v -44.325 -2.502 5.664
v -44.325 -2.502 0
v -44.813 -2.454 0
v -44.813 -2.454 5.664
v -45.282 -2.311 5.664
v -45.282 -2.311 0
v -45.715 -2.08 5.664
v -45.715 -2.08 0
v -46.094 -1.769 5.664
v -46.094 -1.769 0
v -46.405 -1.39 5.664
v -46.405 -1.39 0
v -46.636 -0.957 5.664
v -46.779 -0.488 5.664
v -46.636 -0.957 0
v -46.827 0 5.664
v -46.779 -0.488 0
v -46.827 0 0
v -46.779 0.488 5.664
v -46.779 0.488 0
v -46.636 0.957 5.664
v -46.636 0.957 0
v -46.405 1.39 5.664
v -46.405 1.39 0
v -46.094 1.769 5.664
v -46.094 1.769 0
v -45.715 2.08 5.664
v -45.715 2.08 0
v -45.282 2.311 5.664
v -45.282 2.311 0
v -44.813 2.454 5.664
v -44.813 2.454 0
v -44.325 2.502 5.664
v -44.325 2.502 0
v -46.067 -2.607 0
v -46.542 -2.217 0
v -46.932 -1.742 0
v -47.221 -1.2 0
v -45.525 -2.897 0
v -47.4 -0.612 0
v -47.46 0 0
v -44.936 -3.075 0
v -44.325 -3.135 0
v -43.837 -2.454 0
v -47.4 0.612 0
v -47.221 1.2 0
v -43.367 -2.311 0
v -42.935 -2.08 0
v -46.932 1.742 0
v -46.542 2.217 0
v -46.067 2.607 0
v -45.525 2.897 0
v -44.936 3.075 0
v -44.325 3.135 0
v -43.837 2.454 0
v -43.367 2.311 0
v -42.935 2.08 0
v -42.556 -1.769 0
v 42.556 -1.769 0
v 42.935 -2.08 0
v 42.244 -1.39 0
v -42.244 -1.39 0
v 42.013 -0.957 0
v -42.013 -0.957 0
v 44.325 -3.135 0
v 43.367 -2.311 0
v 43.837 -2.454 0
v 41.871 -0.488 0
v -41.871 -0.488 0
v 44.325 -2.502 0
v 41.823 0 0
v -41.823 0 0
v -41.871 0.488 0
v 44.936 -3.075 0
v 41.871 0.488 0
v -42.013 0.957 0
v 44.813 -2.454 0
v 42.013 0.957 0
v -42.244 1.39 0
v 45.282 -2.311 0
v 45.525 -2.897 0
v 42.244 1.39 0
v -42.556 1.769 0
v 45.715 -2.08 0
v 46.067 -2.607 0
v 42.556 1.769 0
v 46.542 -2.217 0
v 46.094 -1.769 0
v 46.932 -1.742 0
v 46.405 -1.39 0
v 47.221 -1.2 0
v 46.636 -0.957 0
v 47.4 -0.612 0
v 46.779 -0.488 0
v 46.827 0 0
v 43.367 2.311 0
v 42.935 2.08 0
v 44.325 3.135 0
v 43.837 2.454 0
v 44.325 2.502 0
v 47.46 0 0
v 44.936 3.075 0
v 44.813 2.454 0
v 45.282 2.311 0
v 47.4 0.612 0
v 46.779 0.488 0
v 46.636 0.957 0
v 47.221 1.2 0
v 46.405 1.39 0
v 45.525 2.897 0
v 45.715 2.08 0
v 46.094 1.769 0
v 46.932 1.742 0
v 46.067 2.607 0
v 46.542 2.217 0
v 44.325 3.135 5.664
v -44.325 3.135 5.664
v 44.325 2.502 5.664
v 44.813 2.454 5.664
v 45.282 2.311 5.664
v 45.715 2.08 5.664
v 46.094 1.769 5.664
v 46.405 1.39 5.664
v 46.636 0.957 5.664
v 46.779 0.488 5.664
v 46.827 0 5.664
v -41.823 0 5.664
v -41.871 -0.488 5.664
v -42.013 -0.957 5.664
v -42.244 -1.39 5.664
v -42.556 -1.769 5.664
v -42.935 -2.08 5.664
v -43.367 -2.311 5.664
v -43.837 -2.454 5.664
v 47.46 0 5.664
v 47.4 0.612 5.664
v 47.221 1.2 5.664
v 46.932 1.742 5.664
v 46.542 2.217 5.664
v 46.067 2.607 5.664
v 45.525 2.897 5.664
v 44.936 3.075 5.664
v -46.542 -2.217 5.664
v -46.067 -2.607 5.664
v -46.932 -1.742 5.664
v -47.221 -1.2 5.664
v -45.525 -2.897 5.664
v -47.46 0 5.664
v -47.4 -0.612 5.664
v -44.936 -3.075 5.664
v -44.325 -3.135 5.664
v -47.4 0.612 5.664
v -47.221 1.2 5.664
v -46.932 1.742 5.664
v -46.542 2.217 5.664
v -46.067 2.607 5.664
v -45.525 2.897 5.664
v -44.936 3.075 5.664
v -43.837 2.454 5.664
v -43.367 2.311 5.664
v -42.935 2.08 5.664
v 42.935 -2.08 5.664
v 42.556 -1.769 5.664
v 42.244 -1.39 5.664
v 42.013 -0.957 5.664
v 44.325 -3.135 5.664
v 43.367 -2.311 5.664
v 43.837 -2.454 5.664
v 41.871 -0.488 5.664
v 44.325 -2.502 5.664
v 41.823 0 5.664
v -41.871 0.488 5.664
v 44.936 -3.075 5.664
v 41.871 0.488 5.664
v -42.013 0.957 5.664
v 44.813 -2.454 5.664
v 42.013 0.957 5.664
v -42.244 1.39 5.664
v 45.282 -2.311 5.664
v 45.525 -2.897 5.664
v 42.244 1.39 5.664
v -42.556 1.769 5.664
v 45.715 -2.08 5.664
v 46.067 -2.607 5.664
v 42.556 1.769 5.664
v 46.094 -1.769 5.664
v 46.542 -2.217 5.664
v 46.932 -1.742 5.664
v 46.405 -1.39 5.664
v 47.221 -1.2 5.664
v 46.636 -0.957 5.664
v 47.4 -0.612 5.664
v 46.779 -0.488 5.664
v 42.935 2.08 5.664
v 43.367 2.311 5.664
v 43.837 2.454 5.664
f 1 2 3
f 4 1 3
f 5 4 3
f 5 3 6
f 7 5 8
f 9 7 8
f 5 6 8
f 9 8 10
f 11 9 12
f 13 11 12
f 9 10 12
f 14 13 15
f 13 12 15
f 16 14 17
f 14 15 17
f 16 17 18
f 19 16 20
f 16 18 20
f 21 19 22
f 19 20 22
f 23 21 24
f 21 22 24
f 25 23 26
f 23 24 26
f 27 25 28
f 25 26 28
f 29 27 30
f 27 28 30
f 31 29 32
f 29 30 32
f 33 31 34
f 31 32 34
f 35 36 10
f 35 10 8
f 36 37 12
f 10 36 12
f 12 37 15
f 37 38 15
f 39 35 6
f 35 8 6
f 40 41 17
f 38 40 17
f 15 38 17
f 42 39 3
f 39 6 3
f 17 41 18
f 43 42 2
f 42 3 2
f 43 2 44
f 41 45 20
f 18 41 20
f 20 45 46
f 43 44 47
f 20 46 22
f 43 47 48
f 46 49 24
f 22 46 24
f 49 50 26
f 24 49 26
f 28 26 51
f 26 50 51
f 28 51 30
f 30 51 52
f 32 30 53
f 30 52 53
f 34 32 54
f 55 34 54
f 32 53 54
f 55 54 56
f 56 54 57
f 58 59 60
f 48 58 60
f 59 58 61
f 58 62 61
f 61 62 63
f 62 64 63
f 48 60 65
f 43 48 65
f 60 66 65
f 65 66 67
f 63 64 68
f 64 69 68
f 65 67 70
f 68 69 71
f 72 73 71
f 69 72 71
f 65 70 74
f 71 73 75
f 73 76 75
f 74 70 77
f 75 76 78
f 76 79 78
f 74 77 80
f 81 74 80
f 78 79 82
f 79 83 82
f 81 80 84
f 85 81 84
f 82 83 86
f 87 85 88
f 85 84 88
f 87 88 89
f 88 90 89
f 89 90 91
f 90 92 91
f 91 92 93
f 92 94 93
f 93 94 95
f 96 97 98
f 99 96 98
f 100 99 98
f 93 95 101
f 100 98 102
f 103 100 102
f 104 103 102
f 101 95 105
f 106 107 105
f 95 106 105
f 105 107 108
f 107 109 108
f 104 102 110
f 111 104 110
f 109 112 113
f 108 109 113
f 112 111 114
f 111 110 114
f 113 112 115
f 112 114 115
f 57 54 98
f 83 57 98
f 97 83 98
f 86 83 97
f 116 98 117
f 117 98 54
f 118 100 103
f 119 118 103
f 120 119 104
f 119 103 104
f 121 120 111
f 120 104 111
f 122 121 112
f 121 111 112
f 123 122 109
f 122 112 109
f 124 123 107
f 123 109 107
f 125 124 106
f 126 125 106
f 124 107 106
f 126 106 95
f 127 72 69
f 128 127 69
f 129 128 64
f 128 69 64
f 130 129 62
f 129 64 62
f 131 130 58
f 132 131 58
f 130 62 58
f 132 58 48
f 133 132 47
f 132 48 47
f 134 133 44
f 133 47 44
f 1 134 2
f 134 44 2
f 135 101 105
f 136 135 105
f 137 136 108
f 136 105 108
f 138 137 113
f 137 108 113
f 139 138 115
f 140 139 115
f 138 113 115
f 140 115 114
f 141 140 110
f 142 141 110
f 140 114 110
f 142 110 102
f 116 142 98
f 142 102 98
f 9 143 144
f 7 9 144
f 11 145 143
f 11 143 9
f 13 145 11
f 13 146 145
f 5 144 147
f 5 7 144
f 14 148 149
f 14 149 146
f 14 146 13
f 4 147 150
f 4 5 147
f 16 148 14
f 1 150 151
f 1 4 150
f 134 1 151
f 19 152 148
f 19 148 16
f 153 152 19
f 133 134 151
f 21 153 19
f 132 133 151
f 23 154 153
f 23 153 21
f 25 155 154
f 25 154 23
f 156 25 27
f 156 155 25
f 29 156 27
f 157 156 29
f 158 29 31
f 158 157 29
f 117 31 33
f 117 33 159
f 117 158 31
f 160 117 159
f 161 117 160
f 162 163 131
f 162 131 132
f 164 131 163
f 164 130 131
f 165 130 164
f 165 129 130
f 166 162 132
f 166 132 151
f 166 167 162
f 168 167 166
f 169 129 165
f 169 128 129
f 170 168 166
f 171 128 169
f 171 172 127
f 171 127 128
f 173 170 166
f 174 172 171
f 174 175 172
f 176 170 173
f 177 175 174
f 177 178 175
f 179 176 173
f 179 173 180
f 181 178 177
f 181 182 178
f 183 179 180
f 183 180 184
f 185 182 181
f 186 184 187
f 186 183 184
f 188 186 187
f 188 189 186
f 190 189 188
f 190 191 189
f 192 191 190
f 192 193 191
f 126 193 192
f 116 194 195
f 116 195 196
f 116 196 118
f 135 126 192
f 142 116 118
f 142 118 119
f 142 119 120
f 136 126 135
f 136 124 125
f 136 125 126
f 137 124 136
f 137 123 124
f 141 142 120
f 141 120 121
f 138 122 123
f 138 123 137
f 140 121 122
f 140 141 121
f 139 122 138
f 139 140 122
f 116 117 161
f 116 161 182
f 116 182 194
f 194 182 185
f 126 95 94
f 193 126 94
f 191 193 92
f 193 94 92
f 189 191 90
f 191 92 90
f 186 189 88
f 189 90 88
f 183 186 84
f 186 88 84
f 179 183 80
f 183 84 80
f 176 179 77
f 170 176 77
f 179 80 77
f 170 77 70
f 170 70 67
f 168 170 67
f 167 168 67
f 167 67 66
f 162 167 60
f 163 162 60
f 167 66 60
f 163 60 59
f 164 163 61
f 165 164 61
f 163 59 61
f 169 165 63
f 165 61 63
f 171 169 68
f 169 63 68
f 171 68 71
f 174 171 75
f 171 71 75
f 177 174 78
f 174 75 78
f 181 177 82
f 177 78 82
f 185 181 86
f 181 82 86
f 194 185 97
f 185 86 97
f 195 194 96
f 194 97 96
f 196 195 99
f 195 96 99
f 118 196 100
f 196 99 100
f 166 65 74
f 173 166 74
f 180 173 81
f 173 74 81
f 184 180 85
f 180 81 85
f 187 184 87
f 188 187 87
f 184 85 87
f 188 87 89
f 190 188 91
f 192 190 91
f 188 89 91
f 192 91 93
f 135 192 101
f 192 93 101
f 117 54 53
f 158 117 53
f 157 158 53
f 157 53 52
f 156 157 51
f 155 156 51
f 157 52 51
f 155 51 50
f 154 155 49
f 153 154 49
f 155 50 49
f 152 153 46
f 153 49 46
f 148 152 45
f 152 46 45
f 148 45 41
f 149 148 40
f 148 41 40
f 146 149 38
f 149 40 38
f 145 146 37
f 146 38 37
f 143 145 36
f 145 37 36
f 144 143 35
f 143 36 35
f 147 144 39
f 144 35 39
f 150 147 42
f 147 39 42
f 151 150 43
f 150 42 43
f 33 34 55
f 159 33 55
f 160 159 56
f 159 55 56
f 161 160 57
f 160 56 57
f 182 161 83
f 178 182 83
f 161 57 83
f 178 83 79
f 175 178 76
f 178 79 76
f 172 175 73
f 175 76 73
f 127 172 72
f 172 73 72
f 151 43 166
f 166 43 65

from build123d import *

# Parameters (mm, degrees)
F1_DEPTH = 5.6642


with BuildPart() as f1:
    # F0 (on Top) → F1 (new body)
    with BuildSketch(Plane.XY):
        with BuildLine():
            Line((-44.324736, 2.5019), (-44.324736, 3.135164))
            ThreePointArc((-44.324736, 3.135164), (-47.4599, 0), (-44.324736, -3.135164))
            Line((-44.324736, -3.135164), (-44.324736, -2.5019))
            ThreePointArc((-44.324736, -2.5019), (-46.826636, 0), (-44.324736, 2.5019))
        make_face()
        with BuildLine():
            ThreePointArc((-41.189572, 0), (-42.10784, 2.216896), (-44.324736, 3.135164))
            Line((-44.324736, 3.135164), (-44.324736, 2.5019))
            ThreePointArc((-44.324736, 2.5019), (-42.555625, 1.76911), (-41.822836, 0))
            ThreePointArc((-41.822836, 0), (-42.555625, -1.76911), (-44.324736, -2.5019))
            Line((-44.324736, -2.5019), (-44.324736, -3.135164))
            ThreePointArc((-44.324736, -3.135164), (-42.10784, -2.216896), (-41.189572, 0))
        make_face()
        with BuildLine():
            Line((44.324736, 3.135164), (-44.324736, 3.135164))
            ThreePointArc((-44.324736, 3.135164), (-42.10784, 2.216896), (-41.189572, 0))
            ThreePointArc((-41.189572, 0), (-42.10784, -2.216896), (-44.324736, -3.135164))
            Line((-44.324736, -3.135164), (44.324736, -3.135164))
            ThreePointArc((44.324736, -3.135164), (41.189572, 0), (44.324736, 3.135164))
        make_face()
        with BuildLine():
            ThreePointArc((47.4599, 0), (46.541632, 2.216896), (44.324736, 3.135164))
            Line((44.324736, 3.135164), (44.324736, 2.5019))
            ThreePointArc((44.324736, 2.5019), (46.093846, 1.76911), (46.826636, 0))
            ThreePointArc((46.826636, 0), (46.093846, -1.76911), (44.324736, -2.5019))
            Line((44.324736, -2.5019), (44.324736, -3.135164))
            ThreePointArc((44.324736, -3.135164), (46.541632, -2.216896), (47.4599, 0))
        make_face()
        with BuildLine():
            Line((44.324736, 2.5019), (44.324736, 3.135164))
            ThreePointArc((44.324736, 3.135164), (41.189572, 0), (44.324736, -3.135164))
            Line((44.324736, -3.135164), (44.324736, -2.5019))
            ThreePointArc((44.324736, -2.5019), (41.822836, 0), (44.324736, 2.5019))
        make_face()
    extrude(amount=F1_DEPTH)


solid = f1.part
